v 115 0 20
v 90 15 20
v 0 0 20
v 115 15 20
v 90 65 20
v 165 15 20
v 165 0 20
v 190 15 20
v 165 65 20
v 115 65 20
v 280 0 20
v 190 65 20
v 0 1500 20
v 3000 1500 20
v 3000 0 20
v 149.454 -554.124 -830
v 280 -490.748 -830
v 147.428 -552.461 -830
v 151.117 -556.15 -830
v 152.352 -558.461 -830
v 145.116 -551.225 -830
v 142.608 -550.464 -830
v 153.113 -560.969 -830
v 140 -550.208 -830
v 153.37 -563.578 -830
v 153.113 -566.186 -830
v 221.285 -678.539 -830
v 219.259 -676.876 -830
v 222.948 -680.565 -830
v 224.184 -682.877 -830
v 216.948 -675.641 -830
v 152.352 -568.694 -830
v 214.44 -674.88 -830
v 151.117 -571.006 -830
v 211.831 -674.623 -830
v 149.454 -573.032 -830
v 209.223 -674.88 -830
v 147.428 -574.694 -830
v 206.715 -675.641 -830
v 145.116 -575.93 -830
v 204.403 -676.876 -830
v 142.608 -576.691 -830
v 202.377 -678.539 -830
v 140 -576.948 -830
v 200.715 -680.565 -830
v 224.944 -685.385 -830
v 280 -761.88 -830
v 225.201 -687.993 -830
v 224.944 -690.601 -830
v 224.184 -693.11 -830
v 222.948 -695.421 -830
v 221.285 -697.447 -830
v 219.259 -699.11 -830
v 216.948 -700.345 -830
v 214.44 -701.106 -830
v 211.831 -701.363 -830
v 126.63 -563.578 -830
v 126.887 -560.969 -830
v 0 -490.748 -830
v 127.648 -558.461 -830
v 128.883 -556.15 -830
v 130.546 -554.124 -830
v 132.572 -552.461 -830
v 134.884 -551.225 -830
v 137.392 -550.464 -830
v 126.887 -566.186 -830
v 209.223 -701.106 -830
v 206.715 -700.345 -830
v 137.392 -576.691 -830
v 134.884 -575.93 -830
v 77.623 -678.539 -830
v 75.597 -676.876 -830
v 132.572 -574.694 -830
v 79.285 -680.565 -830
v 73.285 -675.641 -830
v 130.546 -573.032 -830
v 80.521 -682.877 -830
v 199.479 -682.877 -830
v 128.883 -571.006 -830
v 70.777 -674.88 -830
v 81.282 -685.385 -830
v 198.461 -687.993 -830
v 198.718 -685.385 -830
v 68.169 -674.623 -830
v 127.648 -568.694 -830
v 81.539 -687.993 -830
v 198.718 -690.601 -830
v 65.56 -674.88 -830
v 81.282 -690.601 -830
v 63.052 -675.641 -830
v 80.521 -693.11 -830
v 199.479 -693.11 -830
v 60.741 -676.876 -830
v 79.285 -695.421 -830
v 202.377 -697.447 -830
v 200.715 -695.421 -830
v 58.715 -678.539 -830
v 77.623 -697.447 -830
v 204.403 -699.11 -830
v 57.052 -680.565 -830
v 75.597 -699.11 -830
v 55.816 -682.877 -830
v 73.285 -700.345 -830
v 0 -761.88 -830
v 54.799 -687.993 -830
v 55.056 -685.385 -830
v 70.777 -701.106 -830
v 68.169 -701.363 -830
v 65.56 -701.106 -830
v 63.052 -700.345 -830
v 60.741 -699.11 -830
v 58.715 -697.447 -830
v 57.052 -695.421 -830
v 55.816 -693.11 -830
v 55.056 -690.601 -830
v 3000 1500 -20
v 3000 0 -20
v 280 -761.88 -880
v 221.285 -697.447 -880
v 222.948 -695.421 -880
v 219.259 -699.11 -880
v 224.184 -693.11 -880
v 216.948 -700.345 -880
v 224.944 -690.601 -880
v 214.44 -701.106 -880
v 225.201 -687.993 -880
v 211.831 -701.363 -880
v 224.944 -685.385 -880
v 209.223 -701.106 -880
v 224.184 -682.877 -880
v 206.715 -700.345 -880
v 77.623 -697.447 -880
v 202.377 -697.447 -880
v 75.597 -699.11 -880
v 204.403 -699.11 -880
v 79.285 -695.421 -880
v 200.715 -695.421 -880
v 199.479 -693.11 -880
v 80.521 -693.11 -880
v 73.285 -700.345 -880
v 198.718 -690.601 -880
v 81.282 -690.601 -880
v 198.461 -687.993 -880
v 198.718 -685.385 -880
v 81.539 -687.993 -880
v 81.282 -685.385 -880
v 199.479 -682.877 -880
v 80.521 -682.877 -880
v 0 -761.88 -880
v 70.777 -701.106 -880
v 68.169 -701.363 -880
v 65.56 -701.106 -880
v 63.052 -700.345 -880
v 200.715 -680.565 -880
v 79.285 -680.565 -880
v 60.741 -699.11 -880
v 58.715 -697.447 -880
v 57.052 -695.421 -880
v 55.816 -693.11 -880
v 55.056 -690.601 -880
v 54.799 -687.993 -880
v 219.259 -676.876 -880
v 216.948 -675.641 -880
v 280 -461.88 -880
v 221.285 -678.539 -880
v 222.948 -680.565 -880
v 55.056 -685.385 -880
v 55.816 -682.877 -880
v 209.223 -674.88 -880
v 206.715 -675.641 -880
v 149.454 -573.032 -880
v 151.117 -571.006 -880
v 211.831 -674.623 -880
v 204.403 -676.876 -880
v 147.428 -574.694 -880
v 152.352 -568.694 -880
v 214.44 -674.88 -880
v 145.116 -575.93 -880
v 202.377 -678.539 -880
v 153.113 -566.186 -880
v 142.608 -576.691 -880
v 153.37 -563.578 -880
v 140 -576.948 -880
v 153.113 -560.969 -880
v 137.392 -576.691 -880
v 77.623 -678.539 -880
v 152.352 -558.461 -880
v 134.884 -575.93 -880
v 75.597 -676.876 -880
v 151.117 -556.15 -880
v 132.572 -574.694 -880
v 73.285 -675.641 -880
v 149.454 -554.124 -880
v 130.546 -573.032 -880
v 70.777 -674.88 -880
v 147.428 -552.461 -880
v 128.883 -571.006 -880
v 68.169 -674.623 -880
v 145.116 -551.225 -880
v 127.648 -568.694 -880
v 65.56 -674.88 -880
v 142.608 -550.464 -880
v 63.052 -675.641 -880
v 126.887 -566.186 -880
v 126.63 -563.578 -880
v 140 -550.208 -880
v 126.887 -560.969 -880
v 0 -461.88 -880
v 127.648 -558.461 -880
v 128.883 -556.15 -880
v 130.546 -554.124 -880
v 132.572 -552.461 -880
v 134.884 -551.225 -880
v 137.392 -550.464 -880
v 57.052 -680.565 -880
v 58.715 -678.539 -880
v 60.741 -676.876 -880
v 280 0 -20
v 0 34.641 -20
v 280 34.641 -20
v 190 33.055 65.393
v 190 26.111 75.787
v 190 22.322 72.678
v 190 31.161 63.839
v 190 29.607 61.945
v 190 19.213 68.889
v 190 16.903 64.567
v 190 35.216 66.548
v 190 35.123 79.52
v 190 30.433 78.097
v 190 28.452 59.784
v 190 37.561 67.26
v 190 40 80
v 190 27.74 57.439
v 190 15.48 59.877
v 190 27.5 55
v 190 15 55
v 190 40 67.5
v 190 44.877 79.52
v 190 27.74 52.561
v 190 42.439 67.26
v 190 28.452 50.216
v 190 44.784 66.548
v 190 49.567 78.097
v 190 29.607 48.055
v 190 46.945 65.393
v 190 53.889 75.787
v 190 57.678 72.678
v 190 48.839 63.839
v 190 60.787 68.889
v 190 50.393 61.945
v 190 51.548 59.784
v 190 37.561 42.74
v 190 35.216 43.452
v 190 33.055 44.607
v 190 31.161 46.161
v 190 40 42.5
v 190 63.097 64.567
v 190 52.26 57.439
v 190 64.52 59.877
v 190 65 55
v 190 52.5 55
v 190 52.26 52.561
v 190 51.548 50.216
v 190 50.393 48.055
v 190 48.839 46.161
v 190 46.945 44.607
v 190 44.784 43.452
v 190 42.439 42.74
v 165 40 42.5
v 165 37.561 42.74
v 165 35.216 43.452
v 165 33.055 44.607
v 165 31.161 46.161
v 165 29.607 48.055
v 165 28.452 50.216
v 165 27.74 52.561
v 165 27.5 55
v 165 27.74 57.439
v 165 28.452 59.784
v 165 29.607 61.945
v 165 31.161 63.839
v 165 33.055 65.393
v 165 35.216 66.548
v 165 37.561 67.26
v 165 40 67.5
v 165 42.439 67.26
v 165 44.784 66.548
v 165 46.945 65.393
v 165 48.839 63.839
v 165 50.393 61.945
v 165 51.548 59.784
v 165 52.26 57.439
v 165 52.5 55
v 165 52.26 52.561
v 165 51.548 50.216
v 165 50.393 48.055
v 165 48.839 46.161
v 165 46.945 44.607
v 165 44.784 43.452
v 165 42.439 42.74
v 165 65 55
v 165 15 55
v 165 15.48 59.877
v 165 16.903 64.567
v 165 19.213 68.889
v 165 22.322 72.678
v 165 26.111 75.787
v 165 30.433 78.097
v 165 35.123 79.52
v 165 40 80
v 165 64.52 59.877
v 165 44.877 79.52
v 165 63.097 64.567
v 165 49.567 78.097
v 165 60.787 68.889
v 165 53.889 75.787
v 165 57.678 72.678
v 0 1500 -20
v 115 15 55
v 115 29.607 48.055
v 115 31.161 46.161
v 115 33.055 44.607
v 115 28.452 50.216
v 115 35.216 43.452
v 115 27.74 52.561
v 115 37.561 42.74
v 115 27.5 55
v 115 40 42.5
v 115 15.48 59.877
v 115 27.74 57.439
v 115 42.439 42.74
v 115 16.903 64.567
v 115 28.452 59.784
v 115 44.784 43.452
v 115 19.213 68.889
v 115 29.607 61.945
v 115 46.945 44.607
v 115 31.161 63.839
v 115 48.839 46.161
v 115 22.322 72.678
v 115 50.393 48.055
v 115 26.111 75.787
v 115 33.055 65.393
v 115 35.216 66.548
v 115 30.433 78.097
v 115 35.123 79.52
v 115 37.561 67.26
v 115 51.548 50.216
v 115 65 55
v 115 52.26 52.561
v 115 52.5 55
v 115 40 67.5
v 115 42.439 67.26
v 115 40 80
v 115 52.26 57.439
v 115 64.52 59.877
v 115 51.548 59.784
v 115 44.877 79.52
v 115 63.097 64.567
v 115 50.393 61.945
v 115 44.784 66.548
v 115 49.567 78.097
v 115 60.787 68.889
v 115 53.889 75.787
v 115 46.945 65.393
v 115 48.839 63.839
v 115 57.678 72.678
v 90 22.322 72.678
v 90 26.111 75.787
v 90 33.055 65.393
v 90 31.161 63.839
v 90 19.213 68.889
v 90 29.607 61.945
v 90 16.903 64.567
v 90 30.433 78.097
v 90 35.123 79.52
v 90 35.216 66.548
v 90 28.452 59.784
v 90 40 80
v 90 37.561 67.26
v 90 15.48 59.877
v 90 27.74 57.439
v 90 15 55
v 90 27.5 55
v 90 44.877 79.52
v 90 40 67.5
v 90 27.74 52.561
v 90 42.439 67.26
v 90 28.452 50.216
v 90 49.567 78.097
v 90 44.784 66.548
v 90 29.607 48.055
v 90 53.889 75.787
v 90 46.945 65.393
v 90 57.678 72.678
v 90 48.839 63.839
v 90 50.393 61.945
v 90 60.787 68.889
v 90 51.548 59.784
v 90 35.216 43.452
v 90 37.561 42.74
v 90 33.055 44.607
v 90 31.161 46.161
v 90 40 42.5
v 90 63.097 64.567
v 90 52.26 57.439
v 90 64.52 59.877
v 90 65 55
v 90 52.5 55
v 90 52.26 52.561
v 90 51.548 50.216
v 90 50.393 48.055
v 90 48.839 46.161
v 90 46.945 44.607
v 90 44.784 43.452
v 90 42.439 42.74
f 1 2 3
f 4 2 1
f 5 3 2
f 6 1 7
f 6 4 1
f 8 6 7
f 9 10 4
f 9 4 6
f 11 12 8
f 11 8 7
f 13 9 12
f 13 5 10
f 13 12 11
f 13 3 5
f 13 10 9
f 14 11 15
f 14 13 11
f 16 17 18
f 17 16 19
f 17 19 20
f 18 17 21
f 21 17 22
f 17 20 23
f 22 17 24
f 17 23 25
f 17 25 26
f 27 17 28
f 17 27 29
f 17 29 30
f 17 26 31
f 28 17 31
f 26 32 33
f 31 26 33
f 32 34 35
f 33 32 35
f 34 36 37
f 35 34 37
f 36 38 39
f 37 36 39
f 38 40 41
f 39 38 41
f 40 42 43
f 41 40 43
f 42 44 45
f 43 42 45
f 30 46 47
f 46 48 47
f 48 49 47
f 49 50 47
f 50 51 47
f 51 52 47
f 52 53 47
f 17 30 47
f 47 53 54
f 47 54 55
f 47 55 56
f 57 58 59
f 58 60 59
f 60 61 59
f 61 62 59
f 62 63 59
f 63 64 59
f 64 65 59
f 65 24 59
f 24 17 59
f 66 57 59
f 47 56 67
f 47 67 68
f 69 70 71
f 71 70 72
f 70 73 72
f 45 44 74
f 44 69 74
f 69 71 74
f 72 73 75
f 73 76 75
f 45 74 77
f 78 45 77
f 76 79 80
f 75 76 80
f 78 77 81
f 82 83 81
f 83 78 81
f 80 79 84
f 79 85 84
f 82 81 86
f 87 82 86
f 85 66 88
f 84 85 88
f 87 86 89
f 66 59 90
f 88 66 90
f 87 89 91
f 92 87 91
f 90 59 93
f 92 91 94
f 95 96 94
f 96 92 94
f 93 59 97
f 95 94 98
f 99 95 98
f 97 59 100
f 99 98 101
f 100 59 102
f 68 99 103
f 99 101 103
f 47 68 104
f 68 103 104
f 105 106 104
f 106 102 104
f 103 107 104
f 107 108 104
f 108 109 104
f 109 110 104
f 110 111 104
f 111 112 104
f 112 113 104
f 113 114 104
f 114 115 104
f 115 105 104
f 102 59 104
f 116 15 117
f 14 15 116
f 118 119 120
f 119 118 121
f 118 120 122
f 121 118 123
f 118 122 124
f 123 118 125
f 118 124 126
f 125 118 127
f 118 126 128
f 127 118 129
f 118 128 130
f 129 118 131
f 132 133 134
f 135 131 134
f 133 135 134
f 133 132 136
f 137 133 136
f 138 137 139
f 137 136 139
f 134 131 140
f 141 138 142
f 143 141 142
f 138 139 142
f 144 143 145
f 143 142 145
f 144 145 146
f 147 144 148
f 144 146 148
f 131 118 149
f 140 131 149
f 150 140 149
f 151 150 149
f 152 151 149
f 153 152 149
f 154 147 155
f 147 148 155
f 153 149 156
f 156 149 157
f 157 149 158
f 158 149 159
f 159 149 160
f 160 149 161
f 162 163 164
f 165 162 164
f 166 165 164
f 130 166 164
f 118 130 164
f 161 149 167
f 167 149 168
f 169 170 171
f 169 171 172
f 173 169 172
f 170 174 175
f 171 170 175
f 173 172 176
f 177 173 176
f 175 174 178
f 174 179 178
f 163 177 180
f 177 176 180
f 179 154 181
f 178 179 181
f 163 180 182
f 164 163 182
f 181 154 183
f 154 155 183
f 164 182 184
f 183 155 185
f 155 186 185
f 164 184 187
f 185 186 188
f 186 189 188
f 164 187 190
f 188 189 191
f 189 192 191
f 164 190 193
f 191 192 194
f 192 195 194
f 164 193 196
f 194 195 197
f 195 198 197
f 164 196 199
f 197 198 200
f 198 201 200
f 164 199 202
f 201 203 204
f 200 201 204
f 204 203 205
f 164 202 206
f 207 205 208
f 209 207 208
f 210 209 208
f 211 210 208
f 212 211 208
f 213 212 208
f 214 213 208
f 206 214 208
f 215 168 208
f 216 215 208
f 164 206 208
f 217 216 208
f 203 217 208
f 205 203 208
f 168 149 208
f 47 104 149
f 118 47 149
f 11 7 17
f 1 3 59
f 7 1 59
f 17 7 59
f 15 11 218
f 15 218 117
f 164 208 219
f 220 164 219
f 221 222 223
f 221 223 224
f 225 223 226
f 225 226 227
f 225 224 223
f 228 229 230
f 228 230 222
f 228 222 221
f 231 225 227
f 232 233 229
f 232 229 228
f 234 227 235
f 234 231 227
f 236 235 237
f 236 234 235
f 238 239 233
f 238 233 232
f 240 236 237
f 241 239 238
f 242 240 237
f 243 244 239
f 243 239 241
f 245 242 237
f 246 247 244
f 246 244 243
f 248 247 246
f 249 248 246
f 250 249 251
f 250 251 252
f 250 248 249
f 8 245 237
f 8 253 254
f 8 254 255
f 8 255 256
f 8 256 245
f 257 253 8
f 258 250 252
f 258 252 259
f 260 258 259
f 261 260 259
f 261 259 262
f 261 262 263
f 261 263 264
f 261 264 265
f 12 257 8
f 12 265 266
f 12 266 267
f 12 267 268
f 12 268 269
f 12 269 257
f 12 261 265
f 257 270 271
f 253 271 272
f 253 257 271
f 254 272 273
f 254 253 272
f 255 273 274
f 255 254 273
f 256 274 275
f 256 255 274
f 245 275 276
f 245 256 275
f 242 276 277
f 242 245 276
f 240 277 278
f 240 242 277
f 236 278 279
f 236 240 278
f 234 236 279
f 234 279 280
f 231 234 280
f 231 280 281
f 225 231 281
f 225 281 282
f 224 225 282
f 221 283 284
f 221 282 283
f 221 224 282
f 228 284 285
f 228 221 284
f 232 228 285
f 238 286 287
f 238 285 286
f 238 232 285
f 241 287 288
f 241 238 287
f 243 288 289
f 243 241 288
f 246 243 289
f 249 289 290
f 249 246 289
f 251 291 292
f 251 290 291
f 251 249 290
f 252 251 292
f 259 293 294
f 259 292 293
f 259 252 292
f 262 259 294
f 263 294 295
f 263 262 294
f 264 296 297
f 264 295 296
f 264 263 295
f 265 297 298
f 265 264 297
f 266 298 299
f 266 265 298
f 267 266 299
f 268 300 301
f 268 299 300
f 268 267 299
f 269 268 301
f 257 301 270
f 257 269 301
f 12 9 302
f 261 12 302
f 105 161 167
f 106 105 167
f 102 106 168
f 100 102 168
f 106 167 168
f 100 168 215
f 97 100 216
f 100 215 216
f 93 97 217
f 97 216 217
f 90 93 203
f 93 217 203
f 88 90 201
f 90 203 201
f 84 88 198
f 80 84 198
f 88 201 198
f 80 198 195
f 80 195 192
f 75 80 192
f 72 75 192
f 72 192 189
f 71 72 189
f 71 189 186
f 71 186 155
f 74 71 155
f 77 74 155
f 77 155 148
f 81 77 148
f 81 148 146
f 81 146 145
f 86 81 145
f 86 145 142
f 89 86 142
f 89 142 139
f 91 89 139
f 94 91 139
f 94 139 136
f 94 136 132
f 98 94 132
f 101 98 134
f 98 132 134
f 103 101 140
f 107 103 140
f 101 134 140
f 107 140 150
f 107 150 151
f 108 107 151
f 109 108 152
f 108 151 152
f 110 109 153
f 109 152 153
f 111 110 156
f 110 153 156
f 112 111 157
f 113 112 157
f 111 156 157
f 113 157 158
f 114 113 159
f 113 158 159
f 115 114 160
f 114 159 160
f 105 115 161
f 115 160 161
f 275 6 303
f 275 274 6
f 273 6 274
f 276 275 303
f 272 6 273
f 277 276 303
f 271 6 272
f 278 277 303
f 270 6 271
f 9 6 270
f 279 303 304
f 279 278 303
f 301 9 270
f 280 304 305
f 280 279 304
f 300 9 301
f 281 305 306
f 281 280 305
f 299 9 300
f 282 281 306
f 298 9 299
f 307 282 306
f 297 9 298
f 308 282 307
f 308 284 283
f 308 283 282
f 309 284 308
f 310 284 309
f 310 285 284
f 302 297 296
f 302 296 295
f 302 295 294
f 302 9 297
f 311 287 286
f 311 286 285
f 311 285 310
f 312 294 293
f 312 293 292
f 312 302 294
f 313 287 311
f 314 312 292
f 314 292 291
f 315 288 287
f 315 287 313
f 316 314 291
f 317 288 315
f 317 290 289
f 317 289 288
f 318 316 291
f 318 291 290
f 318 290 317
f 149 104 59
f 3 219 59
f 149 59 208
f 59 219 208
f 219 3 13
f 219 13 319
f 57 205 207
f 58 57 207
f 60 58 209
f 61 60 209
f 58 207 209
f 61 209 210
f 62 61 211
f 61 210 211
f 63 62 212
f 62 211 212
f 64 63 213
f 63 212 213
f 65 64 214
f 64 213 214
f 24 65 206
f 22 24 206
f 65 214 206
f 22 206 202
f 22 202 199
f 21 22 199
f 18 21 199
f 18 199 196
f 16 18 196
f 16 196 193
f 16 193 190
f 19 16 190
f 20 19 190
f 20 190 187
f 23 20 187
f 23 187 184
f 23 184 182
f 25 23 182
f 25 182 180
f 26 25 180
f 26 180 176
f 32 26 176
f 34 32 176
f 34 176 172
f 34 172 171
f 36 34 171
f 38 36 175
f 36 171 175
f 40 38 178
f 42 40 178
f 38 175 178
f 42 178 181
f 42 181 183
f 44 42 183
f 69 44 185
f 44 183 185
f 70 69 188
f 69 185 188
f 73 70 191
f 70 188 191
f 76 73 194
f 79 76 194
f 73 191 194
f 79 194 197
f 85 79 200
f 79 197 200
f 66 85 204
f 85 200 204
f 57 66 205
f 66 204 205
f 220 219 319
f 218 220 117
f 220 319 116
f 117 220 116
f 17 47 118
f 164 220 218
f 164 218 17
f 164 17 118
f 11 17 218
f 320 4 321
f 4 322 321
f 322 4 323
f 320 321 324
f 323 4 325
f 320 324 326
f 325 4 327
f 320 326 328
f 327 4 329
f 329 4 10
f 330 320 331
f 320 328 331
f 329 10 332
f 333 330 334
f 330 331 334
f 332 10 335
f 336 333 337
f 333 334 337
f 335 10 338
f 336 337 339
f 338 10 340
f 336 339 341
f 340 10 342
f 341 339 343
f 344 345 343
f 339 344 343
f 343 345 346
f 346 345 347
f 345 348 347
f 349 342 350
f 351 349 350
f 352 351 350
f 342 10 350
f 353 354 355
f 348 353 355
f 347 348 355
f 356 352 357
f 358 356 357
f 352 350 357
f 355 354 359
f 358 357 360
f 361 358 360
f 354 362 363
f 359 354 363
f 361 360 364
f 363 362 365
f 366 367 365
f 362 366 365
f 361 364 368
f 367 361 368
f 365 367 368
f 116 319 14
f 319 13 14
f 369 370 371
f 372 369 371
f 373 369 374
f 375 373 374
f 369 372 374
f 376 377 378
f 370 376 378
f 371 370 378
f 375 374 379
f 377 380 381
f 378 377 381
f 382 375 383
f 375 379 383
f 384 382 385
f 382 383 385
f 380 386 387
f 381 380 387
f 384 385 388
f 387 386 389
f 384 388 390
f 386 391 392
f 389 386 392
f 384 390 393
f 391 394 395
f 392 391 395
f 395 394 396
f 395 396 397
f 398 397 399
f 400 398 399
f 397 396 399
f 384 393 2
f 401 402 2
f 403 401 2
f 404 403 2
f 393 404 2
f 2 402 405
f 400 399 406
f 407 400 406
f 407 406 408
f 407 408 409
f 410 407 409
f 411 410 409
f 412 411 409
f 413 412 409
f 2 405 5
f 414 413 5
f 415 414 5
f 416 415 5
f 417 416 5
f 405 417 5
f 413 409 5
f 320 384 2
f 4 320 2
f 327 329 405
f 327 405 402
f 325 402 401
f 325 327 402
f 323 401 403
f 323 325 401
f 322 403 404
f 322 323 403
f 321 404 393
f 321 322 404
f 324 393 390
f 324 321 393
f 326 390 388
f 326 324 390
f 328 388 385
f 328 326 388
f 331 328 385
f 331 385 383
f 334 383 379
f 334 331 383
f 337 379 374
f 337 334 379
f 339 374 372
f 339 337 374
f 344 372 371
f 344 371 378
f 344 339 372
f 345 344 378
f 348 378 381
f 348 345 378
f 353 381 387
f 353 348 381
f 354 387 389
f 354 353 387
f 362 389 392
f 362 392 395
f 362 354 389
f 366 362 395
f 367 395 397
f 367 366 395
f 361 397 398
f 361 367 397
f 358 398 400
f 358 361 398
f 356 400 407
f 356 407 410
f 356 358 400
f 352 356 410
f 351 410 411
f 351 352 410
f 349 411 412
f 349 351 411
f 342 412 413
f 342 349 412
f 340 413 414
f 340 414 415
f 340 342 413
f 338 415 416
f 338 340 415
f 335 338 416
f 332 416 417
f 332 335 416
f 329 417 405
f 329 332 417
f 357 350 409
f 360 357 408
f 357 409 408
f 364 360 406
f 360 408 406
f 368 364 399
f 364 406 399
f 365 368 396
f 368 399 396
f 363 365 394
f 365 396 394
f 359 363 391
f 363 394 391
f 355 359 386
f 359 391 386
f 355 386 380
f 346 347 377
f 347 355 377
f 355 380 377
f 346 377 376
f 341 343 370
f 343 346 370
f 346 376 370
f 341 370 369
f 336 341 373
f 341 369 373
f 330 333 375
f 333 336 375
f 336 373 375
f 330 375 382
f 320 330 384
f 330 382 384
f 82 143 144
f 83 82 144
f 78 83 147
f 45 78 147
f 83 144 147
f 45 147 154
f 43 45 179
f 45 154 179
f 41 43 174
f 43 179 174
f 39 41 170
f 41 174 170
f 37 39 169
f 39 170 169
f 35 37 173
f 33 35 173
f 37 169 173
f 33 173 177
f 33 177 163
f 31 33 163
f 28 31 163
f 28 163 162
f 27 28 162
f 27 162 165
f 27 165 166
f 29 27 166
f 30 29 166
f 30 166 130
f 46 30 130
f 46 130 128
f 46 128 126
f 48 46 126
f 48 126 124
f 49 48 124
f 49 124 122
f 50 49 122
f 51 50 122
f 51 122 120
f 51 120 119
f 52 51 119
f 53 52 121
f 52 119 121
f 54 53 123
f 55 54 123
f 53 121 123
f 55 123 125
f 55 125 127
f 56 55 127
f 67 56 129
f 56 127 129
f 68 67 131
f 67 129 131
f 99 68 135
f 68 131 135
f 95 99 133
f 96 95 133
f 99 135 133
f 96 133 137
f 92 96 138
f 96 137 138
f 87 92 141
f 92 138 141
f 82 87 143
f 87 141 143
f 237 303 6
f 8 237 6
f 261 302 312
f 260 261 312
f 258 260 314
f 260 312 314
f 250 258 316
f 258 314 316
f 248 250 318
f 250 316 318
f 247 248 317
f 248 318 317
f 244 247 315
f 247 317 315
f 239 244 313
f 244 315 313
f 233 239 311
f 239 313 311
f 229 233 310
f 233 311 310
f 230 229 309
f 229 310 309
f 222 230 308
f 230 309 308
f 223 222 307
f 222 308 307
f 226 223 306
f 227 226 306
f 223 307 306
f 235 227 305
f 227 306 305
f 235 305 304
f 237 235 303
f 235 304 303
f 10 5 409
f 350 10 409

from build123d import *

# Parameters (mm, degrees)
ESQUISSE1_W             = 3000
ESQUISSE1_H             = 1500
BOSS_EXTRU_1_DEPTH      = 20
BOSS_EXTRU_2_DEPTH      = 280
ESQUISSE4_R             = 13.37
ENL_V_MAT_EXTRU_1_DEPTH = 3473.751070837
ESQUISSE5_R             = 12.5
BOSS_EXTRU_3_DEPTH      = 50
ESQUISSE6_W             = 73.651656562
ESQUISSE6_H             = 85.918496535
ENL_V_MAT_EXTRU_2_DEPTH = 25


with BuildPart() as part:
    # Esquisse1 → Boss.-Extru.1 (new, symmetric)
    with BuildSketch(Plane.XY):
        with Locations((1500, 750)):
            Rectangle(ESQUISSE1_W, ESQUISSE1_H)
    extrude(amount=BOSS_EXTRU_1_DEPTH, both=True)

    # Esquisse3 → Boss.-Extru.2 (add)
    with BuildSketch(Plane(origin=(0, 0, 0), x_dir=(0, 0, -1), z_dir=(1, 0, 0))):
        Polygon((880, -519.615242271), (830, -490.747728811), (830, -761.880215352), (880, -761.880215352), align=None)
        Polygon((880, -519.615242271), (880, -461.880215352), (830, -461.880215352), (830, -490.747728811), align=None)
        Polygon((880, -461.880215352), (-20, 57.735026919), (-20, 0), (830, -490.747728811), (830, -461.880215352), align=None)
    extrude(amount=BOSS_EXTRU_2_DEPTH)

    # Esquisse4 → Enlèv. mat.-Extru.1 (cut, through all)
    with BuildSketch(Plane(origin=(0, 0, -880), x_dir=(-1, 0, 0), z_dir=(0, 0, -1))):
        with Locations((-140, -563.577557423)):
            Circle(ESQUISSE4_R)
        with Locations((-68.168671163, -687.993068543)):
            Circle(ESQUISSE4_R)
        with Locations((-211.831328836, -687.993068543)):
            Circle(ESQUISSE4_R)
    extrude(amount=-ENL_V_MAT_EXTRU_1_DEPTH, mode=Mode.SUBTRACT)

    # Esquisse5 → Boss.-Extru.3 (add, symmetric)
    with BuildSketch(Plane.ZY.offset(-140)):
        with BuildLine():
            Line((55, 15), (20, 15))
            Line((20, 15), (20, 65))
            Line((20, 65), (55, 65))
            ThreePointArc((55, 65), (80, 40), (55, 15))
        make_face()
        with Locations(Location((55, 40, 0), (0, 0, 180))):
            Circle(ESQUISSE5_R, mode=Mode.SUBTRACT)
    extrude(amount=BOSS_EXTRU_3_DEPTH, both=True)

    # Esquisse6 → Enlèv. mat.-Extru.2 (cut, symmetric)
    with BuildSketch(Plane.ZY.offset(-140)):
        with Locations((56.825828281, 42.959248268)):
            Rectangle(ESQUISSE6_W, ESQUISSE6_H)
    extrude(amount=ENL_V_MAT_EXTRU_2_DEPTH, both=True, mode=Mode.SUBTRACT)


solid = part.part
